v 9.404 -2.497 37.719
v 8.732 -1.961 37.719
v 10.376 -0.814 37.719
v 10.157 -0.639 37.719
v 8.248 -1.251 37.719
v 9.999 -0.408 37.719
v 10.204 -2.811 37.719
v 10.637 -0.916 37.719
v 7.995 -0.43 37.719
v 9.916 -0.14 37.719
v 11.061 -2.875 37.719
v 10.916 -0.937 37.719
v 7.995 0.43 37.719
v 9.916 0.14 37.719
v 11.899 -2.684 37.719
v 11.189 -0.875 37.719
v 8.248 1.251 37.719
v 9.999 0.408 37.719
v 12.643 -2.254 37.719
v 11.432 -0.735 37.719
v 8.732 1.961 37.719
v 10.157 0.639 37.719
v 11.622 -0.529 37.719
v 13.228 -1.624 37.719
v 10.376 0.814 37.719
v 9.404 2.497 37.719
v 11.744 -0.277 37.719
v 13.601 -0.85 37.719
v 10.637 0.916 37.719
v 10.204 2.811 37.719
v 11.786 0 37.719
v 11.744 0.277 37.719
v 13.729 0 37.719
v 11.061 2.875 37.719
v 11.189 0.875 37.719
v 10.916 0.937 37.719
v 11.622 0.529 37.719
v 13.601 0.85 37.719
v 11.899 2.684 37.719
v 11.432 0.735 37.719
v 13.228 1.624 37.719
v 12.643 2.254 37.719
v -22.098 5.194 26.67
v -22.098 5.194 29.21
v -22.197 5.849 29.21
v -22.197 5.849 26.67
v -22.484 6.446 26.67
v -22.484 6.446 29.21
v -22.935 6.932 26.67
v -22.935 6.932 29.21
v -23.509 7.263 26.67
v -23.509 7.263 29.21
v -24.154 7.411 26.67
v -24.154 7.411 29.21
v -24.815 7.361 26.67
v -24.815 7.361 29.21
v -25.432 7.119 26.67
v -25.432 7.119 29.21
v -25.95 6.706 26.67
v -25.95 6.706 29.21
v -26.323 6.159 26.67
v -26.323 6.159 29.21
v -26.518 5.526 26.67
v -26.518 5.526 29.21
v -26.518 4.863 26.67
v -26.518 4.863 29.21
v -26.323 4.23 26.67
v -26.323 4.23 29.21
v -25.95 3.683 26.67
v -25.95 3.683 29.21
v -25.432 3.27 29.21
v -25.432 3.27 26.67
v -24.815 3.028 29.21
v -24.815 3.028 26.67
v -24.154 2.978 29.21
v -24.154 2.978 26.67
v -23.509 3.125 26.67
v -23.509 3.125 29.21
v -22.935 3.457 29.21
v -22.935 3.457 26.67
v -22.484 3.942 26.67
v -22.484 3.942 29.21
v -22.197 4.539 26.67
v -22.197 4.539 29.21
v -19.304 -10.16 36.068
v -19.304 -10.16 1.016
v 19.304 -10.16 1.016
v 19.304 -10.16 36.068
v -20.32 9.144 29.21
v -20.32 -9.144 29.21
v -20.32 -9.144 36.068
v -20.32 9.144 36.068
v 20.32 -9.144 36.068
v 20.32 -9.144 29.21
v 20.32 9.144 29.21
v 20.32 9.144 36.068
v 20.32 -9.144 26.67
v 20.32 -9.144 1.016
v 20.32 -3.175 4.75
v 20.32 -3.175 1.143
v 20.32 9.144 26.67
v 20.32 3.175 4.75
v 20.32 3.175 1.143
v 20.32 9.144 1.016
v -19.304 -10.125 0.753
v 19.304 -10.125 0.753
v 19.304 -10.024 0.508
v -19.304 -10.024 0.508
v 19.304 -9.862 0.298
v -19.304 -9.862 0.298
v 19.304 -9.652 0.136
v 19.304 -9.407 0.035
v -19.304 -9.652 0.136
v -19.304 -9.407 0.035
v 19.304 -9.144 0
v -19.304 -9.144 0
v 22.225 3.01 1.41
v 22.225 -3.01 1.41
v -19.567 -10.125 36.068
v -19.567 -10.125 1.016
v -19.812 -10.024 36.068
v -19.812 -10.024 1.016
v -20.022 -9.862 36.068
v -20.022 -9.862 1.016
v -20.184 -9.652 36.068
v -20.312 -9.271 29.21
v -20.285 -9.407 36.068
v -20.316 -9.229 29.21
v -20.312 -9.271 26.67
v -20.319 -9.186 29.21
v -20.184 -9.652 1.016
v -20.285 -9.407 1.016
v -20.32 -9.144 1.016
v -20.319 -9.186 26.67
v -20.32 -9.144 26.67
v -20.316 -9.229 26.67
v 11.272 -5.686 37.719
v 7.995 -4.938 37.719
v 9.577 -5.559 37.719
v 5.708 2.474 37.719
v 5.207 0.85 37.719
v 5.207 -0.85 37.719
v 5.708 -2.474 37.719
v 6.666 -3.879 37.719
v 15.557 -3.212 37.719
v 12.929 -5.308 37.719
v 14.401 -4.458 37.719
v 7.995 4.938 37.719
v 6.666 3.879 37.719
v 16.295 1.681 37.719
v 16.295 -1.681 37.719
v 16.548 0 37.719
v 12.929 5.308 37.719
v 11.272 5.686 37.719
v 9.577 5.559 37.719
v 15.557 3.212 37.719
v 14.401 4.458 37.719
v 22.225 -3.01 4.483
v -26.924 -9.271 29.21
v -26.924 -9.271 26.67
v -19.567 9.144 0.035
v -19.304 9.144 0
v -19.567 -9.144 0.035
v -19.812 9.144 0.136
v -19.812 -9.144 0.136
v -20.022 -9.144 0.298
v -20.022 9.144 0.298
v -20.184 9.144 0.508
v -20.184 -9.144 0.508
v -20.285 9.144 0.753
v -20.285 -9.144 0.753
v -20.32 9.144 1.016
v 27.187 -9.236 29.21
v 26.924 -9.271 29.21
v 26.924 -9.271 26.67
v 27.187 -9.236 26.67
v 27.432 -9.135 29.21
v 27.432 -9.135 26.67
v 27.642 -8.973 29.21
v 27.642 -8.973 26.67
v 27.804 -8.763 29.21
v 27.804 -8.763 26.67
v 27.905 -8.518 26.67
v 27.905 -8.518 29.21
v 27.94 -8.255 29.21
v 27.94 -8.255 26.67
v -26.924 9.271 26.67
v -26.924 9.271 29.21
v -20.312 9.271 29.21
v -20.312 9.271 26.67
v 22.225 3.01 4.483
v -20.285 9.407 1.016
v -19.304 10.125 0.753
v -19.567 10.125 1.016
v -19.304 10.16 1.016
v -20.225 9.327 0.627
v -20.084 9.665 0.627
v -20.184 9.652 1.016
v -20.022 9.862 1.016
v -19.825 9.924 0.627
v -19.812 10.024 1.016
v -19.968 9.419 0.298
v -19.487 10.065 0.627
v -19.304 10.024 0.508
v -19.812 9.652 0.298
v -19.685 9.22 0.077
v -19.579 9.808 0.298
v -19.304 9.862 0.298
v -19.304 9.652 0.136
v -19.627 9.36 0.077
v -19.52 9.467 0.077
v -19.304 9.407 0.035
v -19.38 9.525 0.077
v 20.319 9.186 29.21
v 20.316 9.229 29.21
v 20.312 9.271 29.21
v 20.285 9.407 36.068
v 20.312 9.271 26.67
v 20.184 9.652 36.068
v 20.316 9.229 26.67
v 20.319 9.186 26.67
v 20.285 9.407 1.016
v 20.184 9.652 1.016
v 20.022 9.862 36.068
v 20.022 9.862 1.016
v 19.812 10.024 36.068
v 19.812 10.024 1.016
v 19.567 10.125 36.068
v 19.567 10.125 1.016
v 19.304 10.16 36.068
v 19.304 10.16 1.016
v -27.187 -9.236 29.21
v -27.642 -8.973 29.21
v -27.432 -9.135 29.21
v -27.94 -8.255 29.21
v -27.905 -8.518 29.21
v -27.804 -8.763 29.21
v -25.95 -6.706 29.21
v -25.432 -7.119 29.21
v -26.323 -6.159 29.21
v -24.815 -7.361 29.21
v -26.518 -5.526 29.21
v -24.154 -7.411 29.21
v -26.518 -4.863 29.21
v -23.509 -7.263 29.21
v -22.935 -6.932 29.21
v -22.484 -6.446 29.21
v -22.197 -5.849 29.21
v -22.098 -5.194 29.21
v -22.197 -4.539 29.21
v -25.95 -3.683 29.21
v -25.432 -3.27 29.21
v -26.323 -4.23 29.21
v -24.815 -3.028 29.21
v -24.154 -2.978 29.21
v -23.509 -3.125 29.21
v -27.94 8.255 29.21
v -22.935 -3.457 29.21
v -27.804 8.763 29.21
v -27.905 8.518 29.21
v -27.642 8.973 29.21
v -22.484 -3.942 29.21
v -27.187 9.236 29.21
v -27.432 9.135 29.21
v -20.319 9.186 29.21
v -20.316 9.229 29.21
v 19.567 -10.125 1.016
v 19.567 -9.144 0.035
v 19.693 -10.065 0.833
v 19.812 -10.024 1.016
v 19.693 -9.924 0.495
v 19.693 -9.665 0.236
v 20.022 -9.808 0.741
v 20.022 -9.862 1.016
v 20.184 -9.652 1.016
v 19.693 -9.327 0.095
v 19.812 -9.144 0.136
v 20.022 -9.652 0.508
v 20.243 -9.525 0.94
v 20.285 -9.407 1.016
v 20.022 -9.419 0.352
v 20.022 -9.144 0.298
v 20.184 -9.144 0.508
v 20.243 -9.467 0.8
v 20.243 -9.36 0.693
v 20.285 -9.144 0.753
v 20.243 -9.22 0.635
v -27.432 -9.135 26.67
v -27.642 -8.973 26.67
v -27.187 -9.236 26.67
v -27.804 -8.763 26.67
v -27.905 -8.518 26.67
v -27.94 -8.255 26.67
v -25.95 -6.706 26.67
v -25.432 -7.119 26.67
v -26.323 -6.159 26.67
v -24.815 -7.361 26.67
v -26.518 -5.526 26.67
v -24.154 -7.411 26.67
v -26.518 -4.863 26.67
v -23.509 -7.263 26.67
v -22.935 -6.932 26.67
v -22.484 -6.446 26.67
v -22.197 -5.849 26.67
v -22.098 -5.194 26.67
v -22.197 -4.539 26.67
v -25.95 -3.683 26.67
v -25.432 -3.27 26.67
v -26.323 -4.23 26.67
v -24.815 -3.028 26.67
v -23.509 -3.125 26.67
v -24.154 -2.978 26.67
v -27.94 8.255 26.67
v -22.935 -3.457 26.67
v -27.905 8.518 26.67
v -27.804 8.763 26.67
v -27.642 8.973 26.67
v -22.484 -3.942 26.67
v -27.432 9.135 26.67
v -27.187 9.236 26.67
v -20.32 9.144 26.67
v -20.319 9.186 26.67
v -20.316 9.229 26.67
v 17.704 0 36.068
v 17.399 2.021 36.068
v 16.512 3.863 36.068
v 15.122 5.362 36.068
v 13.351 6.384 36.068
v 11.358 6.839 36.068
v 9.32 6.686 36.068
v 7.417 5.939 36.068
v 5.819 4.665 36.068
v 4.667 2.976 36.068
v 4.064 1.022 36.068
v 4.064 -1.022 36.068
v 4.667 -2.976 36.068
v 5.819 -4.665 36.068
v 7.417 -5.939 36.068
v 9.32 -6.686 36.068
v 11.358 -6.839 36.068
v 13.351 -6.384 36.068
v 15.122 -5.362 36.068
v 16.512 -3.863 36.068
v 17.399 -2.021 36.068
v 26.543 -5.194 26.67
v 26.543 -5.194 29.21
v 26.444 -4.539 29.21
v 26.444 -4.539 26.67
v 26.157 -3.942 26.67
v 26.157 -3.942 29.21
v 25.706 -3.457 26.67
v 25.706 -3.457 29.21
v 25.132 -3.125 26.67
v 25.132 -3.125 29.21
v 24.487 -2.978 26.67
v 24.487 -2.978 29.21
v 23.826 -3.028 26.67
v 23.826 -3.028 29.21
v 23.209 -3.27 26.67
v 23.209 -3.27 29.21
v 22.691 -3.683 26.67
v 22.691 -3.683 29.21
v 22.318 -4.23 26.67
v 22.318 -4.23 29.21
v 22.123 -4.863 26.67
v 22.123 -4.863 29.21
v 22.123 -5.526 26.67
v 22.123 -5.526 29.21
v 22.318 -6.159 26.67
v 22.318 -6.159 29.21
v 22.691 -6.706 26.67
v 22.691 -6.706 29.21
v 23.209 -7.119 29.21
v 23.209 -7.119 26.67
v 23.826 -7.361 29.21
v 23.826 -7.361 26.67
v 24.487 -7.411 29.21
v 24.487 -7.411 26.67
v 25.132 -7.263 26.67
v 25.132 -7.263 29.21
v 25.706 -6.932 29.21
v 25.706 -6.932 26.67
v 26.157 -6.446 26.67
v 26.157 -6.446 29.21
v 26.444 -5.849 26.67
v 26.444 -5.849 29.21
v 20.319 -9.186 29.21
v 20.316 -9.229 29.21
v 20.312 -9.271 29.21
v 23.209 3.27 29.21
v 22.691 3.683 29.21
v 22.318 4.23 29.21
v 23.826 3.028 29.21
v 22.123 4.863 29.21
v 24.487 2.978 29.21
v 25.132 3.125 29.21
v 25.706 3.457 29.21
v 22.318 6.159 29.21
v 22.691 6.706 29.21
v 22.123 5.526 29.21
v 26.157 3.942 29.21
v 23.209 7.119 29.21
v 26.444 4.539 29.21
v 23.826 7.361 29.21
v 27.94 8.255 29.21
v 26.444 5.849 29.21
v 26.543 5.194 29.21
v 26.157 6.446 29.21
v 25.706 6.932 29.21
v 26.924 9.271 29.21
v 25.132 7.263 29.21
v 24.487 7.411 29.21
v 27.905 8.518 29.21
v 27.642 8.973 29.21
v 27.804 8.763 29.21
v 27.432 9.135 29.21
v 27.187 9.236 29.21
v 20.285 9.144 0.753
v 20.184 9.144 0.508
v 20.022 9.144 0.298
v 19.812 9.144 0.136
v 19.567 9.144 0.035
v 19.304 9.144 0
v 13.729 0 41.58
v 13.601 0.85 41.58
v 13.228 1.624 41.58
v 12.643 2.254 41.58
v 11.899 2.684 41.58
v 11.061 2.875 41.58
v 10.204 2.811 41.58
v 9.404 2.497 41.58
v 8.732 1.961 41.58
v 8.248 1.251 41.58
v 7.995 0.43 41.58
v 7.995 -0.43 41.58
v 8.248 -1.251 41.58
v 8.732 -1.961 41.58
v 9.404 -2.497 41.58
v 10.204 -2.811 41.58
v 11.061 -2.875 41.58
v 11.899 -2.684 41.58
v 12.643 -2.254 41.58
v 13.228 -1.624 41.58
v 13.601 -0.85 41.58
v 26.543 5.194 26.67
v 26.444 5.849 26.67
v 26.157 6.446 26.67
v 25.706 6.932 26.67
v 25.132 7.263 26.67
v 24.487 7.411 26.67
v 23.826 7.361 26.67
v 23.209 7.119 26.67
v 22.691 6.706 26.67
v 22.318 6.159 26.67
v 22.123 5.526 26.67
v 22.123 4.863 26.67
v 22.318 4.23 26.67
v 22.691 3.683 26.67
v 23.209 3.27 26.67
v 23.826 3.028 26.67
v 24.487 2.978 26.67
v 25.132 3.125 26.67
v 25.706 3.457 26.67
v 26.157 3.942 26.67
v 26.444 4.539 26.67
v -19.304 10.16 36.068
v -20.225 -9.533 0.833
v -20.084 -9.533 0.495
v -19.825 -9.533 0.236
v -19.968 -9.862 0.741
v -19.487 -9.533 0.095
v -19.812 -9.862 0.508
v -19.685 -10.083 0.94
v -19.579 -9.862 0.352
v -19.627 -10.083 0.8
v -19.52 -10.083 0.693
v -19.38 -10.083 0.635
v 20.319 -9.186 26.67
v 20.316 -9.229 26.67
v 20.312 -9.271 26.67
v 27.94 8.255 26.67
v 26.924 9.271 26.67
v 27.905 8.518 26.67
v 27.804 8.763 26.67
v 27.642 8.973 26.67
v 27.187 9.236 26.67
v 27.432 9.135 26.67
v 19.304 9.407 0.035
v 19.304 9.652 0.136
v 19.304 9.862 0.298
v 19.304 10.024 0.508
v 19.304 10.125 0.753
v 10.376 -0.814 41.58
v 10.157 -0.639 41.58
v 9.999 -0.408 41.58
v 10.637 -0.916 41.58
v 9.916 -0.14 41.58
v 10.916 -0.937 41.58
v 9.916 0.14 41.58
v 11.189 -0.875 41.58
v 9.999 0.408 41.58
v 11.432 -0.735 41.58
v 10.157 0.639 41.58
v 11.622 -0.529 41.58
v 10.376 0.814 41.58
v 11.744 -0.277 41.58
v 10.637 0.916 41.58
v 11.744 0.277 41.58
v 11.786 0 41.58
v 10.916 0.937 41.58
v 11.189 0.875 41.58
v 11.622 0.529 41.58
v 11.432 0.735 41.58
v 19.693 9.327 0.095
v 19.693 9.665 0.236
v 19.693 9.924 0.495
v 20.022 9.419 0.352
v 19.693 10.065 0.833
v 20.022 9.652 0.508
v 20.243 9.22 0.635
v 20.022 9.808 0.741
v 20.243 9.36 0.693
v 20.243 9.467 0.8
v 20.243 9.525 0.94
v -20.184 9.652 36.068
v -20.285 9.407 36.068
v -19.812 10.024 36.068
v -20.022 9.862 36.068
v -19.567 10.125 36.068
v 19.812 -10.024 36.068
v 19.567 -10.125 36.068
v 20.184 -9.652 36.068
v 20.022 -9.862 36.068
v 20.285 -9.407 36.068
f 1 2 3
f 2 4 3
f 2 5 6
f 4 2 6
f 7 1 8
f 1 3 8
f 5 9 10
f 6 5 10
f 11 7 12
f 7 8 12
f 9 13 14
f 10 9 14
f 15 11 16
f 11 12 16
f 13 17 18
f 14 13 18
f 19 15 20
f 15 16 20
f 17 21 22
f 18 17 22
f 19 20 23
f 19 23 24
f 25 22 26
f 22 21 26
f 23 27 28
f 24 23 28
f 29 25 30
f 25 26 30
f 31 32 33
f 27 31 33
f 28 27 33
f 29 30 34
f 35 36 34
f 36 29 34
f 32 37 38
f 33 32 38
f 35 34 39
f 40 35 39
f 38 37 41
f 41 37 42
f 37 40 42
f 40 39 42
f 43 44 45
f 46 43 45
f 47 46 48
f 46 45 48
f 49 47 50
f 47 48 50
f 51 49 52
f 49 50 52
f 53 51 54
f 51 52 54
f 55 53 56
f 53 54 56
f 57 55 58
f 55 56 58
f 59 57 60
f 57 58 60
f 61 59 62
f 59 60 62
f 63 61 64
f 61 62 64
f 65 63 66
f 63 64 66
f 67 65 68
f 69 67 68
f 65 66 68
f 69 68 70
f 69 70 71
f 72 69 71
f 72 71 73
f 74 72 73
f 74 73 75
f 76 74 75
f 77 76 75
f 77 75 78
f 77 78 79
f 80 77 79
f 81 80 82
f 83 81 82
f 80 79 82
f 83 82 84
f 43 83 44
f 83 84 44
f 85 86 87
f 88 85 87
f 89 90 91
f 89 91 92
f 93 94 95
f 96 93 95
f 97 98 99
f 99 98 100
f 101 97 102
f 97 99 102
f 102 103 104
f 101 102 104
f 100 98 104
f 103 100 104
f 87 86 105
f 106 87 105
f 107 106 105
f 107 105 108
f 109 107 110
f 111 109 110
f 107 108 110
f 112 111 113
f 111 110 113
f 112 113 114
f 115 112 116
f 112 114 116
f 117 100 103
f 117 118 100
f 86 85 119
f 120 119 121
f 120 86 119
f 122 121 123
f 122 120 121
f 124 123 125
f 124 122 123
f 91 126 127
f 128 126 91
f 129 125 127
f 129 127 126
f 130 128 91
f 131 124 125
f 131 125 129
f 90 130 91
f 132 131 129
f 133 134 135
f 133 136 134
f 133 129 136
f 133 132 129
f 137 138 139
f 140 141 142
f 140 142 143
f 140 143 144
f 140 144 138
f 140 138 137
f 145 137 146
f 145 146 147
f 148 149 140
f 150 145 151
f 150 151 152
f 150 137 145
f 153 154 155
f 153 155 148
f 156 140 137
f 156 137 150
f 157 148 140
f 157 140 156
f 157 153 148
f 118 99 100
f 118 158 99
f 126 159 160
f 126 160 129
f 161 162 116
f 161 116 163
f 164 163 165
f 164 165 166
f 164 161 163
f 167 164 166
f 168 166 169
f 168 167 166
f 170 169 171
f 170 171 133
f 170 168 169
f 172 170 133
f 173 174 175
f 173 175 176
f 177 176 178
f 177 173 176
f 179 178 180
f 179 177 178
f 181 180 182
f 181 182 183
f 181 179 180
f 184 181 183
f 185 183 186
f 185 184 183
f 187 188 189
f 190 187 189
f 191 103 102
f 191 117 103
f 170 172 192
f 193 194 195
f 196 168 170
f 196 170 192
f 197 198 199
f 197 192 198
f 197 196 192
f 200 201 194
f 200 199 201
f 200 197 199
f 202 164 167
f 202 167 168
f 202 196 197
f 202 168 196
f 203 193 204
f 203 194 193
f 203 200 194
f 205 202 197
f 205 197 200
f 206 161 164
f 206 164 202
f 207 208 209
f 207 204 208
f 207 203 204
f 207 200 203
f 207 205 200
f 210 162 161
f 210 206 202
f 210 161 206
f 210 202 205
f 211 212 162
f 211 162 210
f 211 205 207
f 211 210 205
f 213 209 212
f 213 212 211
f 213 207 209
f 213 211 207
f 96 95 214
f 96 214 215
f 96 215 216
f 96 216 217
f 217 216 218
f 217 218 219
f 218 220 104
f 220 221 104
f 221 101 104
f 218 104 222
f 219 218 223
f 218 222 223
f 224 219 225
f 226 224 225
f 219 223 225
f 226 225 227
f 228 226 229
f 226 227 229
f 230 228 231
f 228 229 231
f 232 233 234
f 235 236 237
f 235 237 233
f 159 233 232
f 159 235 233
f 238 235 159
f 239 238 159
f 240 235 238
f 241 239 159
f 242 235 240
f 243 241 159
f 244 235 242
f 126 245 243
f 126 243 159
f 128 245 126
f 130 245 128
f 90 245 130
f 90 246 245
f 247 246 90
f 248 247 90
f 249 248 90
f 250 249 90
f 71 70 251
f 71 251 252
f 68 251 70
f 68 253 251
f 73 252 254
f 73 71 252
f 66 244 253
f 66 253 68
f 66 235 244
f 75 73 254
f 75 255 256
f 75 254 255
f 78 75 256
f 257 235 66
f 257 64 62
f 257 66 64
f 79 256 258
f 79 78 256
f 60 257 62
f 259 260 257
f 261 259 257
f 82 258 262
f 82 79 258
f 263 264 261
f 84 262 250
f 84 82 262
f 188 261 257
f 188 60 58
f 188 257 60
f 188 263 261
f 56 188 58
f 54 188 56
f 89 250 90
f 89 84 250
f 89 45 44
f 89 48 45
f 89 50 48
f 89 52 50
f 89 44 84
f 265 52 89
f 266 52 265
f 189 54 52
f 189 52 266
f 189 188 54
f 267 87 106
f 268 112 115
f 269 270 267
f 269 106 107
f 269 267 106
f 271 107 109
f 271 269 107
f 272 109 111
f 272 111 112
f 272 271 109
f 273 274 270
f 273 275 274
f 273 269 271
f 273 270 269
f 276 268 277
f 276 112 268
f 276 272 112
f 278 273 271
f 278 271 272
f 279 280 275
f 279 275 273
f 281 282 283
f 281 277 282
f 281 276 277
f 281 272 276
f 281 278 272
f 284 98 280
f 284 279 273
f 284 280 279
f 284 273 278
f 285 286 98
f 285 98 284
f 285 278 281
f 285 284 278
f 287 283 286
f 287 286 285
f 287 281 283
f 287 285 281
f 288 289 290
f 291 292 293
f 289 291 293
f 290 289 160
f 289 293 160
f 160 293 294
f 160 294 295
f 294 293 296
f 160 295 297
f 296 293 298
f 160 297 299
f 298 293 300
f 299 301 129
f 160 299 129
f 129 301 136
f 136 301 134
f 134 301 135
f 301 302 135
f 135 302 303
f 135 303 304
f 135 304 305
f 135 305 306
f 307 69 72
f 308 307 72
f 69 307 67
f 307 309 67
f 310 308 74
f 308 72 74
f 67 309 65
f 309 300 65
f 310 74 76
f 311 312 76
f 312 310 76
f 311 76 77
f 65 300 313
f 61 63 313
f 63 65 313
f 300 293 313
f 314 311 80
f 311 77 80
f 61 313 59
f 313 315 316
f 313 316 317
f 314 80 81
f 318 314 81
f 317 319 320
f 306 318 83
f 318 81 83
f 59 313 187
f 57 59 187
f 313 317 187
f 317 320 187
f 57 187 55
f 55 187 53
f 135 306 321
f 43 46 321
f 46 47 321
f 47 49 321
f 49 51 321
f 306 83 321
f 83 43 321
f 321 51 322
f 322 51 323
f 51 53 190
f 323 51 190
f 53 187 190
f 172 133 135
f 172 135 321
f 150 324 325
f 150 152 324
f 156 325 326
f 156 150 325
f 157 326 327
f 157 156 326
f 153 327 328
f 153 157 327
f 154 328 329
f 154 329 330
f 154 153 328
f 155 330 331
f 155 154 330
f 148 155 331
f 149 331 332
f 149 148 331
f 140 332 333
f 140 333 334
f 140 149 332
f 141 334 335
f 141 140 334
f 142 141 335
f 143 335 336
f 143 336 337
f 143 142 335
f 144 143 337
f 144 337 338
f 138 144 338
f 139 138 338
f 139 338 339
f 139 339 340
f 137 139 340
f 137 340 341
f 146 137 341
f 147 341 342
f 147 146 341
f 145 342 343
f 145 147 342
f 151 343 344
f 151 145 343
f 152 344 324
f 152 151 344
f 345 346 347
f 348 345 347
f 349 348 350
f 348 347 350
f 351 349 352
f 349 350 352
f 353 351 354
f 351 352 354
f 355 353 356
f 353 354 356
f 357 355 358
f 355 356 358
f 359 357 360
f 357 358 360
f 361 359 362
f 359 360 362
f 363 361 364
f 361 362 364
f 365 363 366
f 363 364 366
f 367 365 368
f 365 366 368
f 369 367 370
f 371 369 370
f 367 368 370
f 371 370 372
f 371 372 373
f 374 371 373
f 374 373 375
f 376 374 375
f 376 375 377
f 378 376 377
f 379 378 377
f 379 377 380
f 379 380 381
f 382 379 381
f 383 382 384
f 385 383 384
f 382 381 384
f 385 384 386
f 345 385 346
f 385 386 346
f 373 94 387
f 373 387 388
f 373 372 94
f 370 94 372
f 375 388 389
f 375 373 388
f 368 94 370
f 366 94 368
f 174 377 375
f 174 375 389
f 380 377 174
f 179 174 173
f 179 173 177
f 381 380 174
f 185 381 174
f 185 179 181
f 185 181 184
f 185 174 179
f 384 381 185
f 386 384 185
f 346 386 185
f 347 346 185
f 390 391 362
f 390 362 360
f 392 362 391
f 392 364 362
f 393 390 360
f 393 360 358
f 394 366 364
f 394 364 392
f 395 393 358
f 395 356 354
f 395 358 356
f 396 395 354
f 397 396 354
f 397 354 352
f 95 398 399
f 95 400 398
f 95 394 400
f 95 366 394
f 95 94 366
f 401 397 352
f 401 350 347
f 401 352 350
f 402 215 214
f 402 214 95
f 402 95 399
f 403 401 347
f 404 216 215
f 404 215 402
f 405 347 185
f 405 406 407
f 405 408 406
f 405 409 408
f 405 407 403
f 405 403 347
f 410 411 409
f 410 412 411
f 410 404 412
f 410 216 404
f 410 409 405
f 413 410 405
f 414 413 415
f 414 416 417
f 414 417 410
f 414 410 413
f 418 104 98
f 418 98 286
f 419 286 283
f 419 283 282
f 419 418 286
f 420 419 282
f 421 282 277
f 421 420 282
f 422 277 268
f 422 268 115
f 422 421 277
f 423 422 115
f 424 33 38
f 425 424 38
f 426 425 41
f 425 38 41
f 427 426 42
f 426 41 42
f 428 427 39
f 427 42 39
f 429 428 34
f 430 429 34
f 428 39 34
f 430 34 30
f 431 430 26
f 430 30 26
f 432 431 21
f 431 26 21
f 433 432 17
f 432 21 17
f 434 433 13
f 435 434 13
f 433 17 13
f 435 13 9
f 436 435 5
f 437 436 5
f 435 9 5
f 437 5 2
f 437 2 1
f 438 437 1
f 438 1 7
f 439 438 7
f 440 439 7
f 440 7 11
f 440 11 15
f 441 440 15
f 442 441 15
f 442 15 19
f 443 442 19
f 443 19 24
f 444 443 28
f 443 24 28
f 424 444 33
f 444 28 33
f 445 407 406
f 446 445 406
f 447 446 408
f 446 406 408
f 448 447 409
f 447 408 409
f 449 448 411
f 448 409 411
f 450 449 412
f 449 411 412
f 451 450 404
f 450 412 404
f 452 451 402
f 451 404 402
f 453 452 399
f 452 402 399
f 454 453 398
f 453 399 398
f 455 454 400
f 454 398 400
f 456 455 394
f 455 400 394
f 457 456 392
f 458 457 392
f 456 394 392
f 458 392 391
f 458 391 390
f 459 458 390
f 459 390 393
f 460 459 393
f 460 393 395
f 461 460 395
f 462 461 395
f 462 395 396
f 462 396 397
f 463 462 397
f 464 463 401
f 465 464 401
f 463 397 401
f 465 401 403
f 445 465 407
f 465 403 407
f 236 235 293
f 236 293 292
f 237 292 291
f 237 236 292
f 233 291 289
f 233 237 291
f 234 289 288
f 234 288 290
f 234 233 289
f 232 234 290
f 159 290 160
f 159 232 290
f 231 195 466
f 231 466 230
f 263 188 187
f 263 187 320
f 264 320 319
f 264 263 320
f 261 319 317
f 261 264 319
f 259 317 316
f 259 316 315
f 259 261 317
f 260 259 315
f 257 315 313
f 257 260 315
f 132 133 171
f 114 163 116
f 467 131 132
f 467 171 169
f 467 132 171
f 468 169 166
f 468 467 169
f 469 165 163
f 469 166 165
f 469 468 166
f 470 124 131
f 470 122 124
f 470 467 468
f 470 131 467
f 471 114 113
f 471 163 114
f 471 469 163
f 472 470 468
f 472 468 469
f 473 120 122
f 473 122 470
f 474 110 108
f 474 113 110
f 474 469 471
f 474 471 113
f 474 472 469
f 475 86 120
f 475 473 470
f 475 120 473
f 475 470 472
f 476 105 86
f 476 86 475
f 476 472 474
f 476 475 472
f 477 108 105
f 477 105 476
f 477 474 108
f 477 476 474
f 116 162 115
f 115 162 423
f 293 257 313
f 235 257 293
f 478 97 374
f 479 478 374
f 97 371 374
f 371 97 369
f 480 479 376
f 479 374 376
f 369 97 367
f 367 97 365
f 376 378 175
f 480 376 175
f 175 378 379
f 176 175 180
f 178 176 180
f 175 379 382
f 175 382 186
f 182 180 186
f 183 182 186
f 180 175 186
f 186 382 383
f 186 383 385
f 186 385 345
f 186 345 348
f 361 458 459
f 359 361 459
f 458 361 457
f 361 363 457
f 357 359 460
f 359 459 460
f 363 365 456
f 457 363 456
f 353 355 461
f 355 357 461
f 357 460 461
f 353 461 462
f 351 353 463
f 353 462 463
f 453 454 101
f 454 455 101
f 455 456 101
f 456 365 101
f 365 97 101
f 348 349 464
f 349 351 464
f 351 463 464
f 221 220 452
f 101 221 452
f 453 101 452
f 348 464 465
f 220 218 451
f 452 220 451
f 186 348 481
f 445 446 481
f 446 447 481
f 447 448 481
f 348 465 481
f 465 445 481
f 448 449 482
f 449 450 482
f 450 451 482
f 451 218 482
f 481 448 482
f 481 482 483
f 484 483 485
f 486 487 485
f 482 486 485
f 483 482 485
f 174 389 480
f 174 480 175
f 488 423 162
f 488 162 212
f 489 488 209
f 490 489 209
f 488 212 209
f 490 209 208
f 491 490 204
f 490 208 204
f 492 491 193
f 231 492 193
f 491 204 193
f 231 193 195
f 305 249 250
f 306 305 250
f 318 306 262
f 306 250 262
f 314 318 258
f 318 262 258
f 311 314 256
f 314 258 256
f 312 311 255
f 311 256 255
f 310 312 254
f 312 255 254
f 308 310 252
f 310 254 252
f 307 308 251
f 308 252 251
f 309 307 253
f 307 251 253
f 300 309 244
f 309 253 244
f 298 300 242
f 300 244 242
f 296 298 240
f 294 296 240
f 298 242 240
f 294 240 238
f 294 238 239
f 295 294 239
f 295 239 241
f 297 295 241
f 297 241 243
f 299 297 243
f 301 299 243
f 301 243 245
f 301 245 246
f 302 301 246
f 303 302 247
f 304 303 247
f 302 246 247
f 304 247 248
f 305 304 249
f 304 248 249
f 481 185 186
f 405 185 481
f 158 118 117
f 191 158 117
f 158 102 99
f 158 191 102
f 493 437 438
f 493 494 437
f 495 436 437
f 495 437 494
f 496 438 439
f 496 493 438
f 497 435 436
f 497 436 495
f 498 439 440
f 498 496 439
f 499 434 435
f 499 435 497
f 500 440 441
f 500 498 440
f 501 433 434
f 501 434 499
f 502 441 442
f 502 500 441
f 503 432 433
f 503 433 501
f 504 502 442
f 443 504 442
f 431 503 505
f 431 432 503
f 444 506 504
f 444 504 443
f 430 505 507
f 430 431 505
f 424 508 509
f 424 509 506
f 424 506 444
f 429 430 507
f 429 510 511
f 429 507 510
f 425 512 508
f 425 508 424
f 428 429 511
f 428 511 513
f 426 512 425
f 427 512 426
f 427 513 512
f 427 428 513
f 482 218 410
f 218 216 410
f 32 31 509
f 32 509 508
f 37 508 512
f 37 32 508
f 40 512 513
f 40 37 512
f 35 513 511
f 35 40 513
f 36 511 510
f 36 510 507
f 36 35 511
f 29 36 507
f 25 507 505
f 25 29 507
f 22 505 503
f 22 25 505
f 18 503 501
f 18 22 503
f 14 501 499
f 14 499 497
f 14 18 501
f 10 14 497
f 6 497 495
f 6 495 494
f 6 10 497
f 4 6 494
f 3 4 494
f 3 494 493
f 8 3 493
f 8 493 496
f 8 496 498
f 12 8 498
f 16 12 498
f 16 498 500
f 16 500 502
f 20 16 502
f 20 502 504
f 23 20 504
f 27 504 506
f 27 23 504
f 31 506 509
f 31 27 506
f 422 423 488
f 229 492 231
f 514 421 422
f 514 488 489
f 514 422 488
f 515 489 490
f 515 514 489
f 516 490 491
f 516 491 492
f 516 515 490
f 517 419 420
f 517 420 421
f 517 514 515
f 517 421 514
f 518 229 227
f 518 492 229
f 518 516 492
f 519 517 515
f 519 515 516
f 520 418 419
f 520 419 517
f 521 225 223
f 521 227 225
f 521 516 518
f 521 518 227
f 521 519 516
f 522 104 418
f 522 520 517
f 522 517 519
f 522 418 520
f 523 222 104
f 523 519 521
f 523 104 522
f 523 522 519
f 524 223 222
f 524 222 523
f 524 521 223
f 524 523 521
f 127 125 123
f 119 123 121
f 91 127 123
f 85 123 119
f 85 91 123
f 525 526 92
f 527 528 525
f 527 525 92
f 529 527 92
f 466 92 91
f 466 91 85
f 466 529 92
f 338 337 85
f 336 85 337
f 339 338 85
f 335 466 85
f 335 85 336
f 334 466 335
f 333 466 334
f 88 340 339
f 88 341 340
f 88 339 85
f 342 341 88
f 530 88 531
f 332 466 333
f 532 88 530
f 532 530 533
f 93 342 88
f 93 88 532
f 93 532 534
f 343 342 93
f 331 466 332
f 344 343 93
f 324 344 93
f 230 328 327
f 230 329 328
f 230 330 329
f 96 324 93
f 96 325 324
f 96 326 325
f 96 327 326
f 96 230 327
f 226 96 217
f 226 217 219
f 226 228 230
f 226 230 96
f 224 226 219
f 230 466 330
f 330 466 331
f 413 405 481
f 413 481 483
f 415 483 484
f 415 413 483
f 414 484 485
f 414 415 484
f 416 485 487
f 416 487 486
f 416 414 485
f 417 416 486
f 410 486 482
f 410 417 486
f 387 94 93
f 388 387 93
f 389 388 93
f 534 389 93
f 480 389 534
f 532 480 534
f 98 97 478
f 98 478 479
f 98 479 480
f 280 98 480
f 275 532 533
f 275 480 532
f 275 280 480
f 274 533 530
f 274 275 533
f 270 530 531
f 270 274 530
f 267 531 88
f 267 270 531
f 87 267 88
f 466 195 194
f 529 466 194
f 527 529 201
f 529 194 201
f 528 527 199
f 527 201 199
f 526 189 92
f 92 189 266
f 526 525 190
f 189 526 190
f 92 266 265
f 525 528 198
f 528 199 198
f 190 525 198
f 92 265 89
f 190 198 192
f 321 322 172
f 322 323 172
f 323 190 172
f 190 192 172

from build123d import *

# Parameters (mm, degrees)
F0_W           = 40.64
F0_H           = 20.32
F1_DEPTH       = 36.068
F2_W           = 6.35
F2_H           = 3.6068
F4_W           = 6.0198
F4_H           = 3.0734
F7_R           = 2.2225
F8_DEPTH       = 2.54
F9_R           = 6.858
F11_R          = 5.7023
F13_T1_DEPTH   = 38.608
F13_T3_DEPTH   = 18.288
F13_S7_W       = 1.016
F13_S7_H       = 1.016
F13_T8_DEPTH   = 1.016
F13_S13_W      = 1.016
F13_S13_H      = 1.016
F13_T14_DEPTH  = 1.016
F13_S19_W      = 1.016
F13_S19_H      = 1.016
F13_T20_DEPTH  = 1.016
F13_S25_W      = 1.016
F13_S25_H      = 1.016
F13_T26_DEPTH  = 1.016
F13_T32_DEPTH  = 37.592
F13_T38_DEPTH  = 37.592
F13_T44_DEPTH  = 37.592
F13_T51_DEPTH  = 37.592
F13_T57_DEPTH  = 37.592
F13_T63_DEPTH  = 37.592
F13_T69_DEPTH  = 37.592
F13_T75_DEPTH  = 37.592
F13_T82_DEPTH  = 37.592
F13_T88_DEPTH  = 37.592
F13_T94_DEPTH  = 37.592
F13_T100_DEPTH = 37.592
F13_T106_DEPTH = 37.592
F13_T113_DEPTH = 37.592
F13_T119_DEPTH = 37.592
F13_T125_DEPTH = 37.592
F13_T131_DEPTH = 37.592
F13_T137_DEPTH = 37.592
F13_T144_DEPTH = 37.592
F13_T150_DEPTH = 37.592
F14_R          = 2.8829
F14_R_2        = 0.9398
F15_DEPTH      = 3.8608


# Not quite as in the source:
# - a fillet or chamfer that OpenCascade refuses, or shapes differently, is made with other operations: its cross-section is extruded or revolved along the edge and cut away or added


with BuildPart() as f1:
    # F0 (on Top) → F1 (new body)
    with BuildSketch(Plane.XY):
        Rectangle(F0_W, F0_H)
    extrude(amount=F1_DEPTH)

    # F2 (on face) → F5 section 0
    with BuildSketch(Plane.YZ.offset(20.32)):
        with Locations((0, 2.9464)):
            Rectangle(F2_W, F2_H)
    # F4 (on offset) → F5 section 1
    with BuildSketch(Plane.YZ.offset(22.225)):
        with Locations((0, 2.9464)):
            Rectangle(F4_W, F4_H)
    loft()

    # F7 (on offset) → F8 (join)
    with BuildSketch(Plane.XY.offset(29.21)):
        with BuildLine():
            ThreePointArc((-27.94, -8.255), (-27.6424204897, -8.9734204897), (-26.924, -9.271))
            Line((-26.924, -9.271), (-20.32, -9.271))
            Line((-20.32, -9.271), (-20.32, 9.271))
            Line((-20.32, 9.271), (-26.924, 9.271))
            ThreePointArc((-26.924, 9.271), (-27.6424204897, 8.9734204897), (-27.94, 8.255))
            Line((-27.94, 8.255), (-27.94, -8.255))
        make_face()
        with Locations((-24.3205, -5.1943)):
            Circle(F7_R, mode=Mode.SUBTRACT)
        with Locations((-24.3205, 5.1943)):
            Circle(F7_R, mode=Mode.SUBTRACT)
        with BuildLine():
            ThreePointArc((27.94, 8.255), (27.6424204897, 8.9734204897), (26.924, 9.271))
            Line((26.924, 9.271), (20.32, 9.271))
            Line((20.32, 9.271), (20.32, -9.271))
            Line((20.32, -9.271), (26.924, -9.271))
            ThreePointArc((26.924, -9.271), (27.6424204897, -8.9734204897), (27.94, -8.255))
            Line((27.94, -8.255), (27.94, 8.255))
        make_face()
        with Locations((24.3205, -5.1943)):
            Circle(F7_R, mode=Mode.SUBTRACT)
        with Locations((24.3205, 5.1943)):
            Circle(F7_R, mode=Mode.SUBTRACT)
    extrude(amount=-F8_DEPTH)

    # F9 (on face) → F12 section 0
    with BuildSketch(Plane.XY.offset(36.068)):
        with Locations((10.8458, 0)):
            Circle(F9_R)
    # F11 (on offset) → F12 section 1
    with BuildSketch(Plane.XY.offset(37.719)):
        with Locations((10.8458, 0)):
            Circle(F11_R)
    loft()

    # F13: fillet of radius 1.016 on 8 edges, made by hand

    # F13_s2 → F13_t1 (cut)
    with BuildSketch(Plane.YZ.offset(-19.304)):
        with BuildLine():
            ThreePointArc((-10.16, 1.016), (-9.8624204897, 0.2975795103), (-9.144, 0))
            Line((-9.144, 0), (-10.16, 0))
            Line((-10.16, 0), (-10.16, 1.016))
        make_face()
        with BuildLine():
            ThreePointArc((9.144, 0), (9.8624204897, 0.2975795103), (10.16, 1.016))
            Line((10.16, 1.016), (10.16, 0))
            Line((10.16, 0), (9.144, 0))
        make_face()
    extrude(amount=F13_T1_DEPTH, mode=Mode.SUBTRACT)

    # F13_s4 → F13_t3 (cut)
    with BuildSketch(Plane.XZ.offset(-9.144)):
        with BuildLine():
            ThreePointArc((20.32, 1.016), (20.0224204897, 0.2975795103), (19.304, 0))
            Line((19.304, 0), (20.32, 0))
            Line((20.32, 0), (20.32, 1.016))
        make_face()
        with BuildLine():
            ThreePointArc((-19.304, 0), (-20.0224204897, 0.2975795103), (-20.32, 1.016))
            Line((-20.32, 1.016), (-20.32, 0))
            Line((-20.32, 0), (-19.304, 0))
        make_face()
    extrude(amount=F13_T3_DEPTH, mode=Mode.SUBTRACT)


with BuildPart() as f13_tool6:
    # F13_s7 → F13_t8 (new body)
    with BuildSketch(Plane.YZ.offset(19.304)):
        with Locations((-9.652, 0.508)):
            Rectangle(F13_S7_W, F13_S7_H)
    extrude(amount=F13_T8_DEPTH)

    # F13_s9 → F13_t10 (revolve, cut)
    with BuildSketch(Plane(origin=(19.304, -9.144, 1.016), x_dir=(0, 0.7071067812, 0.7071067812), z_dir=(0, 0.7071067812, -0.7071067812))):
        with BuildLine():
            ThreePointArc((0, -1.016), (1.016, 0), (0, 1.016))
            Line((0, 1.016), (0, -1.016))
        make_face()
    revolve(axis=Axis((19.304, -9.144, 1.016), (1, 0, 0)), mode=Mode.SUBTRACT)


with BuildPart() as f1_1:
    add(f1.part)

    # F13_t5: cut F13_tool6
    add(f13_tool6.part, mode=Mode.SUBTRACT)


with BuildPart() as f13_tool12:
    # F13_s13 → F13_t14 (new body)
    with BuildSketch(Plane.YZ.offset(19.304)):
        with Locations((9.652, 0.508)):
            Rectangle(F13_S13_W, F13_S13_H)
    extrude(amount=F13_T14_DEPTH)

    # F13_s15 → F13_t16 (revolve, cut)
    with BuildSketch(Plane(origin=(19.304, 9.144, 1.016), x_dir=(0, -0.7071067812, 0.7071067812), z_dir=(0, 0.7071067812, 0.7071067812))):
        with BuildLine():
            ThreePointArc((0, -1.016), (1.016, 0), (0, 1.016))
            Line((0, 1.016), (0, -1.016))
        make_face()
    revolve(axis=Axis((19.304, 9.144, 1.016), (1, 0, 0)), mode=Mode.SUBTRACT)


with BuildPart() as f1_2:
    add(f1_1.part)

    # F13_t11: cut F13_tool12
    add(f13_tool12.part, mode=Mode.SUBTRACT)


with BuildPart() as f13_tool18:
    # F13_s19 → F13_t20 (new body)
    with BuildSketch(Plane.XY.offset(1.016)):
        with Locations((-19.812, 9.652)):
            Rectangle(F13_S19_W, F13_S19_H)
    extrude(amount=-F13_T20_DEPTH)

    # F13_s21 → F13_t22 (revolve, cut)
    with BuildSketch(Plane(origin=(-19.304, 9.144, 1.016), x_dir=(0.7071067812, -0.7071067812, 0), z_dir=(0.7071067812, 0.7071067812, 0))):
        with BuildLine():
            ThreePointArc((0, -1.016), (1.016, 0), (0, 1.016))
            Line((0, 1.016), (0, -1.016))
        make_face()
    revolve(axis=Axis((-19.304, 9.144, 1.016), (0, 0, -1)), mode=Mode.SUBTRACT)


with BuildPart() as f1_3:
    add(f1_2.part)

    # F13_t17: cut F13_tool18
    add(f13_tool18.part, mode=Mode.SUBTRACT)


with BuildPart() as f13_tool24:
    # F13_s25 → F13_t26 (new body)
    with BuildSketch(Plane.XZ.offset(9.144)):
        with Locations((-19.812, 0.508)):
            Rectangle(F13_S25_W, F13_S25_H)
    extrude(amount=F13_T26_DEPTH)

    # F13_s27 → F13_t28 (revolve, cut)
    with BuildSketch(Plane(origin=(-19.304, -9.144, 1.016), x_dir=(0.7071067812, 0, 0.7071067812), z_dir=(0.7071067812, 0, -0.7071067812))):
        with BuildLine():
            ThreePointArc((0, -1.016), (1.016, 0), (0, 1.016))
            Line((0, 1.016), (0, -1.016))
        make_face()
    revolve(axis=Axis((-19.304, -9.144, 1.016), (0, -1, 0)), mode=Mode.SUBTRACT)


with BuildPart() as f1_4:
    add(f1_3.part)

    # F13_t23: cut F13_tool24
    add(f13_tool24.part, mode=Mode.SUBTRACT)


with BuildPart() as f13_tool30:
    # F13_s31 → F13_t32 (new body)
    with BuildSketch(Plane.XY.offset(1.016)):
        with BuildLine():
            ThreePointArc((20.32, -9.144), (20.0224204897, -9.8624204897), (19.304, -10.16))
            Line((19.304, -10.16), (20.32, -10.16))
            Line((20.32, -10.16), (20.32, -9.144))
        make_face()
    extrude(amount=F13_T32_DEPTH)

    split(bisect_by=Plane.XY.offset(26.67), keep=Keep.BOTTOM)

    split(bisect_by=Plane.XZ.offset(9.271), keep=Keep.BOTTOM)


with BuildPart() as f1_5:
    add(f1_4.part)

    # F13_t29: cut F13_tool30
    add(f13_tool30.part, mode=Mode.SUBTRACT)


with BuildPart() as f13_tool36:
    # F13_s37 → F13_t38 (new body)
    with BuildSketch(Plane.XY.offset(1.016)):
        with BuildLine():
            ThreePointArc((20.32, -9.144), (20.0224204897, -9.8624204897), (19.304, -10.16))
            Line((19.304, -10.16), (20.32, -10.16))
            Line((20.32, -10.16), (20.32, -9.144))
        make_face()
    extrude(amount=F13_T38_DEPTH)

    split(bisect_by=Plane.XY.offset(26.67), keep=Keep.BOTTOM)

    split(bisect_by=Plane.XZ.offset(9.271), keep=Keep.TOP)


with BuildPart() as f1_6:
    add(f1_5.part)

    # F13_t35: cut F13_tool36
    add(f13_tool36.part, mode=Mode.SUBTRACT)


with BuildPart() as f13_tool42:
    # F13_s43 → F13_t44 (new body)
    with BuildSketch(Plane.XY.offset(1.016)):
        with BuildLine():
            ThreePointArc((20.32, -9.144), (20.0224204897, -9.8624204897), (19.304, -10.16))
            Line((19.304, -10.16), (20.32, -10.16))
            Line((20.32, -10.16), (20.32, -9.144))
        make_face()
    extrude(amount=F13_T44_DEPTH)

    split(bisect_by=Plane.XY.offset(26.67), keep=Keep.TOP)

    split(bisect_by=Plane.XZ.offset(9.271), keep=Keep.TOP)

    split(bisect_by=Plane.XY.offset(29.21), keep=Keep.BOTTOM)


with BuildPart() as f1_7:
    add(f1_6.part)

    # F13_t41: cut F13_tool42
    add(f13_tool42.part, mode=Mode.SUBTRACT)


with BuildPart() as f13_tool49:
    # F13_s50 → F13_t51 (new body)
    with BuildSketch(Plane.XY.offset(1.016)):
        with BuildLine():
            ThreePointArc((20.32, -9.144), (20.0224204897, -9.8624204897), (19.304, -10.16))
            Line((19.304, -10.16), (20.32, -10.16))
            Line((20.32, -10.16), (20.32, -9.144))
        make_face()
    extrude(amount=F13_T51_DEPTH)

    split(bisect_by=Plane.XZ.offset(9.271), keep=Keep.BOTTOM)

    split(bisect_by=Plane.XY.offset(29.21), keep=Keep.TOP)


with BuildPart() as f1_8:
    add(f1_7.part)

    # F13_t48: cut F13_tool49
    add(f13_tool49.part, mode=Mode.SUBTRACT)


with BuildPart() as f13_tool55:
    # F13_s56 → F13_t57 (new body)
    with BuildSketch(Plane.XY.offset(1.016)):
        with BuildLine():
            ThreePointArc((20.32, -9.144), (20.0224204897, -9.8624204897), (19.304, -10.16))
            Line((19.304, -10.16), (20.32, -10.16))
            Line((20.32, -10.16), (20.32, -9.144))
        make_face()
    extrude(amount=F13_T57_DEPTH)

    split(bisect_by=Plane.XZ.offset(9.271), keep=Keep.TOP)

    split(bisect_by=Plane.XY.offset(29.21), keep=Keep.TOP)


with BuildPart() as f1_9:
    add(f1_8.part)

    # F13_t54: cut F13_tool55
    add(f13_tool55.part, mode=Mode.SUBTRACT)


with BuildPart() as f13_tool61:
    # F13_s62 → F13_t63 (new body)
    with BuildSketch(Plane.XY.offset(1.016)):
        with BuildLine():
            ThreePointArc((20.32, 9.144), (20.0224204897, 9.8624204897), (19.304, 10.16))
            Line((19.304, 10.16), (20.32, 10.16))
            Line((20.32, 10.16), (20.32, 9.144))
        make_face()
    extrude(amount=F13_T63_DEPTH)

    split(bisect_by=Plane.XZ.offset(-9.271), keep=Keep.TOP)

    split(bisect_by=Plane.XY.offset(26.67), keep=Keep.BOTTOM)


with BuildPart() as f1_10:
    add(f1_9.part)

    # F13_t60: cut F13_tool61
    add(f13_tool61.part, mode=Mode.SUBTRACT)


with BuildPart() as f13_tool67:
    # F13_s68 → F13_t69 (new body)
    with BuildSketch(Plane.XY.offset(1.016)):
        with BuildLine():
            ThreePointArc((20.32, 9.144), (20.0224204897, 9.8624204897), (19.304, 10.16))
            Line((19.304, 10.16), (20.32, 10.16))
            Line((20.32, 10.16), (20.32, 9.144))
        make_face()
    extrude(amount=F13_T69_DEPTH)

    split(bisect_by=Plane.XZ.offset(-9.271), keep=Keep.BOTTOM)

    split(bisect_by=Plane.XY.offset(26.67), keep=Keep.BOTTOM)


with BuildPart() as f1_11:
    add(f1_10.part)

    # F13_t66: cut F13_tool67
    add(f13_tool67.part, mode=Mode.SUBTRACT)


with BuildPart() as f13_tool73:
    # F13_s74 → F13_t75 (new body)
    with BuildSketch(Plane.XY.offset(1.016)):
        with BuildLine():
            ThreePointArc((20.32, 9.144), (20.0224204897, 9.8624204897), (19.304, 10.16))
            Line((19.304, 10.16), (20.32, 10.16))
            Line((20.32, 10.16), (20.32, 9.144))
        make_face()
    extrude(amount=F13_T75_DEPTH)

    split(bisect_by=Plane.XZ.offset(-9.271), keep=Keep.BOTTOM)

    split(bisect_by=Plane.XY.offset(26.67), keep=Keep.TOP)

    split(bisect_by=Plane.XY.offset(29.21), keep=Keep.BOTTOM)


with BuildPart() as f1_12:
    add(f1_11.part)

    # F13_t72: cut F13_tool73
    add(f13_tool73.part, mode=Mode.SUBTRACT)


with BuildPart() as f13_tool80:
    # F13_s81 → F13_t82 (new body)
    with BuildSketch(Plane.XY.offset(1.016)):
        with BuildLine():
            ThreePointArc((20.32, 9.144), (20.0224204897, 9.8624204897), (19.304, 10.16))
            Line((19.304, 10.16), (20.32, 10.16))
            Line((20.32, 10.16), (20.32, 9.144))
        make_face()
    extrude(amount=F13_T82_DEPTH)

    split(bisect_by=Plane.XZ.offset(-9.271), keep=Keep.TOP)

    split(bisect_by=Plane.XY.offset(29.21), keep=Keep.TOP)


with BuildPart() as f1_13:
    add(f1_12.part)

    # F13_t79: cut F13_tool80
    add(f13_tool80.part, mode=Mode.SUBTRACT)


with BuildPart() as f13_tool86:
    # F13_s87 → F13_t88 (new body)
    with BuildSketch(Plane.XY.offset(1.016)):
        with BuildLine():
            ThreePointArc((20.32, 9.144), (20.0224204897, 9.8624204897), (19.304, 10.16))
            Line((19.304, 10.16), (20.32, 10.16))
            Line((20.32, 10.16), (20.32, 9.144))
        make_face()
    extrude(amount=F13_T88_DEPTH)

    split(bisect_by=Plane.XZ.offset(-9.271), keep=Keep.BOTTOM)

    split(bisect_by=Plane.XY.offset(29.21), keep=Keep.TOP)


with BuildPart() as f1_14:
    add(f1_13.part)

    # F13_t85: cut F13_tool86
    add(f13_tool86.part, mode=Mode.SUBTRACT)


with BuildPart() as f13_tool92:
    # F13_s93 → F13_t94 (new body)
    with BuildSketch(Plane.XY.offset(1.016)):
        with BuildLine():
            ThreePointArc((-19.304, 10.16), (-20.0224204897, 9.8624204897), (-20.32, 9.144))
            Line((-20.32, 9.144), (-20.32, 10.16))
            Line((-20.32, 10.16), (-19.304, 10.16))
        make_face()
    extrude(amount=F13_T94_DEPTH)

    split(bisect_by=Plane.XY.offset(26.67), keep=Keep.BOTTOM)

    split(bisect_by=Plane.XZ.offset(-9.271), keep=Keep.BOTTOM)


with BuildPart() as f1_15:
    add(f1_14.part)

    # F13_t91: cut F13_tool92
    add(f13_tool92.part, mode=Mode.SUBTRACT)


with BuildPart() as f13_tool98:
    # F13_s99 → F13_t100 (new body)
    with BuildSketch(Plane.XY.offset(1.016)):
        with BuildLine():
            ThreePointArc((-19.304, 10.16), (-20.0224204897, 9.8624204897), (-20.32, 9.144))
            Line((-20.32, 9.144), (-20.32, 10.16))
            Line((-20.32, 10.16), (-19.304, 10.16))
        make_face()
    extrude(amount=F13_T100_DEPTH)

    split(bisect_by=Plane.XY.offset(26.67), keep=Keep.BOTTOM)

    split(bisect_by=Plane.XZ.offset(-9.271), keep=Keep.TOP)


with BuildPart() as f1_16:
    add(f1_15.part)

    # F13_t97: cut F13_tool98
    add(f13_tool98.part, mode=Mode.SUBTRACT)


with BuildPart() as f13_tool104:
    # F13_s105 → F13_t106 (new body)
    with BuildSketch(Plane.XY.offset(1.016)):
        with BuildLine():
            ThreePointArc((-19.304, 10.16), (-20.0224204897, 9.8624204897), (-20.32, 9.144))
            Line((-20.32, 9.144), (-20.32, 10.16))
            Line((-20.32, 10.16), (-19.304, 10.16))
        make_face()
    extrude(amount=F13_T106_DEPTH)

    split(bisect_by=Plane.XY.offset(26.67), keep=Keep.TOP)

    split(bisect_by=Plane.XZ.offset(-9.271), keep=Keep.BOTTOM)

    split(bisect_by=Plane.XY.offset(29.21), keep=Keep.BOTTOM)


with BuildPart() as f1_17:
    add(f1_16.part)

    # F13_t103: cut F13_tool104
    add(f13_tool104.part, mode=Mode.SUBTRACT)


with BuildPart() as f13_tool111:
    # F13_s112 → F13_t113 (new body)
    with BuildSketch(Plane.XY.offset(1.016)):
        with BuildLine():
            ThreePointArc((-19.304, 10.16), (-20.0224204897, 9.8624204897), (-20.32, 9.144))
            Line((-20.32, 9.144), (-20.32, 10.16))
            Line((-20.32, 10.16), (-19.304, 10.16))
        make_face()
    extrude(amount=F13_T113_DEPTH)

    split(bisect_by=Plane.XZ.offset(-9.271), keep=Keep.BOTTOM)

    split(bisect_by=Plane.XY.offset(29.21), keep=Keep.TOP)


with BuildPart() as f1_18:
    add(f1_17.part)

    # F13_t110: cut F13_tool111
    add(f13_tool111.part, mode=Mode.SUBTRACT)


with BuildPart() as f13_tool117:
    # F13_s118 → F13_t119 (new body)
    with BuildSketch(Plane.XY.offset(1.016)):
        with BuildLine():
            ThreePointArc((-19.304, 10.16), (-20.0224204897, 9.8624204897), (-20.32, 9.144))
            Line((-20.32, 9.144), (-20.32, 10.16))
            Line((-20.32, 10.16), (-19.304, 10.16))
        make_face()
    extrude(amount=F13_T119_DEPTH)

    split(bisect_by=Plane.XZ.offset(-9.271), keep=Keep.TOP)

    split(bisect_by=Plane.XY.offset(29.21), keep=Keep.TOP)


with BuildPart() as f1_19:
    add(f1_18.part)

    # F13_t116: cut F13_tool117
    add(f13_tool117.part, mode=Mode.SUBTRACT)


with BuildPart() as f13_tool123:
    # F13_s124 → F13_t125 (new body)
    with BuildSketch(Plane.XY.offset(1.016)):
        with BuildLine():
            ThreePointArc((-19.304, -10.16), (-20.0224204897, -9.8624204897), (-20.32, -9.144))
            Line((-20.32, -9.144), (-20.32, -10.16))
            Line((-20.32, -10.16), (-19.304, -10.16))
        make_face()
    extrude(amount=F13_T125_DEPTH)

    split(bisect_by=Plane.XZ.offset(9.271), keep=Keep.TOP)

    split(bisect_by=Plane.XY.offset(26.67), keep=Keep.BOTTOM)


with BuildPart() as f1_20:
    add(f1_19.part)

    # F13_t122: cut F13_tool123
    add(f13_tool123.part, mode=Mode.SUBTRACT)


with BuildPart() as f13_tool129:
    # F13_s130 → F13_t131 (new body)
    with BuildSketch(Plane.XY.offset(1.016)):
        with BuildLine():
            ThreePointArc((-19.304, -10.16), (-20.0224204897, -9.8624204897), (-20.32, -9.144))
            Line((-20.32, -9.144), (-20.32, -10.16))
            Line((-20.32, -10.16), (-19.304, -10.16))
        make_face()
    extrude(amount=F13_T131_DEPTH)

    split(bisect_by=Plane.XZ.offset(9.271), keep=Keep.BOTTOM)

    split(bisect_by=Plane.XY.offset(26.67), keep=Keep.BOTTOM)


with BuildPart() as f1_21:
    add(f1_20.part)

    # F13_t128: cut F13_tool129
    add(f13_tool129.part, mode=Mode.SUBTRACT)


with BuildPart() as f13_tool135:
    # F13_s136 → F13_t137 (new body)
    with BuildSketch(Plane.XY.offset(1.016)):
        with BuildLine():
            ThreePointArc((-19.304, -10.16), (-20.0224204897, -9.8624204897), (-20.32, -9.144))
            Line((-20.32, -9.144), (-20.32, -10.16))
            Line((-20.32, -10.16), (-19.304, -10.16))
        make_face()
    extrude(amount=F13_T137_DEPTH)

    split(bisect_by=Plane.XZ.offset(9.271), keep=Keep.TOP)

    split(bisect_by=Plane.XY.offset(26.67), keep=Keep.TOP)

    split(bisect_by=Plane.XY.offset(29.21), keep=Keep.BOTTOM)


with BuildPart() as f1_22:
    add(f1_21.part)

    # F13_t134: cut F13_tool135
    add(f13_tool135.part, mode=Mode.SUBTRACT)


with BuildPart() as f13_tool142:
    # F13_s143 → F13_t144 (new body)
    with BuildSketch(Plane.XY.offset(1.016)):
        with BuildLine():
            ThreePointArc((-19.304, -10.16), (-20.0224204897, -9.8624204897), (-20.32, -9.144))
            Line((-20.32, -9.144), (-20.32, -10.16))
            Line((-20.32, -10.16), (-19.304, -10.16))
        make_face()
    extrude(amount=F13_T144_DEPTH)

    split(bisect_by=Plane.XZ.offset(9.271), keep=Keep.TOP)

    split(bisect_by=Plane.XY.offset(29.21), keep=Keep.TOP)


with BuildPart() as f1_23:
    add(f1_22.part)

    # F13_t141: cut F13_tool142
    add(f13_tool142.part, mode=Mode.SUBTRACT)


with BuildPart() as f13_tool148:
    # F13_s149 → F13_t150 (new body)
    with BuildSketch(Plane.XY.offset(1.016)):
        with BuildLine():
            ThreePointArc((-19.304, -10.16), (-20.0224204897, -9.8624204897), (-20.32, -9.144))
            Line((-20.32, -9.144), (-20.32, -10.16))
            Line((-20.32, -10.16), (-19.304, -10.16))
        make_face()
    extrude(amount=F13_T150_DEPTH)

    split(bisect_by=Plane.XZ.offset(9.271), keep=Keep.BOTTOM)

    split(bisect_by=Plane.XY.offset(29.21), keep=Keep.TOP)


with BuildPart() as f1_24:
    add(f1_23.part)

    # F13_t147: cut F13_tool148
    add(f13_tool148.part, mode=Mode.SUBTRACT)


with BuildPart() as f15:
    # F14 (on face) → F15 (new body)
    with BuildSketch(Plane.XY.offset(37.719)):
        with Locations((10.8458, 0)):
            Circle(F14_R)
        with Locations((10.8458, 0)):
            Circle(F14_R_2, mode=Mode.SUBTRACT)
    extrude(amount=F15_DEPTH)


solid = Compound([f1_24.part, f15.part])
